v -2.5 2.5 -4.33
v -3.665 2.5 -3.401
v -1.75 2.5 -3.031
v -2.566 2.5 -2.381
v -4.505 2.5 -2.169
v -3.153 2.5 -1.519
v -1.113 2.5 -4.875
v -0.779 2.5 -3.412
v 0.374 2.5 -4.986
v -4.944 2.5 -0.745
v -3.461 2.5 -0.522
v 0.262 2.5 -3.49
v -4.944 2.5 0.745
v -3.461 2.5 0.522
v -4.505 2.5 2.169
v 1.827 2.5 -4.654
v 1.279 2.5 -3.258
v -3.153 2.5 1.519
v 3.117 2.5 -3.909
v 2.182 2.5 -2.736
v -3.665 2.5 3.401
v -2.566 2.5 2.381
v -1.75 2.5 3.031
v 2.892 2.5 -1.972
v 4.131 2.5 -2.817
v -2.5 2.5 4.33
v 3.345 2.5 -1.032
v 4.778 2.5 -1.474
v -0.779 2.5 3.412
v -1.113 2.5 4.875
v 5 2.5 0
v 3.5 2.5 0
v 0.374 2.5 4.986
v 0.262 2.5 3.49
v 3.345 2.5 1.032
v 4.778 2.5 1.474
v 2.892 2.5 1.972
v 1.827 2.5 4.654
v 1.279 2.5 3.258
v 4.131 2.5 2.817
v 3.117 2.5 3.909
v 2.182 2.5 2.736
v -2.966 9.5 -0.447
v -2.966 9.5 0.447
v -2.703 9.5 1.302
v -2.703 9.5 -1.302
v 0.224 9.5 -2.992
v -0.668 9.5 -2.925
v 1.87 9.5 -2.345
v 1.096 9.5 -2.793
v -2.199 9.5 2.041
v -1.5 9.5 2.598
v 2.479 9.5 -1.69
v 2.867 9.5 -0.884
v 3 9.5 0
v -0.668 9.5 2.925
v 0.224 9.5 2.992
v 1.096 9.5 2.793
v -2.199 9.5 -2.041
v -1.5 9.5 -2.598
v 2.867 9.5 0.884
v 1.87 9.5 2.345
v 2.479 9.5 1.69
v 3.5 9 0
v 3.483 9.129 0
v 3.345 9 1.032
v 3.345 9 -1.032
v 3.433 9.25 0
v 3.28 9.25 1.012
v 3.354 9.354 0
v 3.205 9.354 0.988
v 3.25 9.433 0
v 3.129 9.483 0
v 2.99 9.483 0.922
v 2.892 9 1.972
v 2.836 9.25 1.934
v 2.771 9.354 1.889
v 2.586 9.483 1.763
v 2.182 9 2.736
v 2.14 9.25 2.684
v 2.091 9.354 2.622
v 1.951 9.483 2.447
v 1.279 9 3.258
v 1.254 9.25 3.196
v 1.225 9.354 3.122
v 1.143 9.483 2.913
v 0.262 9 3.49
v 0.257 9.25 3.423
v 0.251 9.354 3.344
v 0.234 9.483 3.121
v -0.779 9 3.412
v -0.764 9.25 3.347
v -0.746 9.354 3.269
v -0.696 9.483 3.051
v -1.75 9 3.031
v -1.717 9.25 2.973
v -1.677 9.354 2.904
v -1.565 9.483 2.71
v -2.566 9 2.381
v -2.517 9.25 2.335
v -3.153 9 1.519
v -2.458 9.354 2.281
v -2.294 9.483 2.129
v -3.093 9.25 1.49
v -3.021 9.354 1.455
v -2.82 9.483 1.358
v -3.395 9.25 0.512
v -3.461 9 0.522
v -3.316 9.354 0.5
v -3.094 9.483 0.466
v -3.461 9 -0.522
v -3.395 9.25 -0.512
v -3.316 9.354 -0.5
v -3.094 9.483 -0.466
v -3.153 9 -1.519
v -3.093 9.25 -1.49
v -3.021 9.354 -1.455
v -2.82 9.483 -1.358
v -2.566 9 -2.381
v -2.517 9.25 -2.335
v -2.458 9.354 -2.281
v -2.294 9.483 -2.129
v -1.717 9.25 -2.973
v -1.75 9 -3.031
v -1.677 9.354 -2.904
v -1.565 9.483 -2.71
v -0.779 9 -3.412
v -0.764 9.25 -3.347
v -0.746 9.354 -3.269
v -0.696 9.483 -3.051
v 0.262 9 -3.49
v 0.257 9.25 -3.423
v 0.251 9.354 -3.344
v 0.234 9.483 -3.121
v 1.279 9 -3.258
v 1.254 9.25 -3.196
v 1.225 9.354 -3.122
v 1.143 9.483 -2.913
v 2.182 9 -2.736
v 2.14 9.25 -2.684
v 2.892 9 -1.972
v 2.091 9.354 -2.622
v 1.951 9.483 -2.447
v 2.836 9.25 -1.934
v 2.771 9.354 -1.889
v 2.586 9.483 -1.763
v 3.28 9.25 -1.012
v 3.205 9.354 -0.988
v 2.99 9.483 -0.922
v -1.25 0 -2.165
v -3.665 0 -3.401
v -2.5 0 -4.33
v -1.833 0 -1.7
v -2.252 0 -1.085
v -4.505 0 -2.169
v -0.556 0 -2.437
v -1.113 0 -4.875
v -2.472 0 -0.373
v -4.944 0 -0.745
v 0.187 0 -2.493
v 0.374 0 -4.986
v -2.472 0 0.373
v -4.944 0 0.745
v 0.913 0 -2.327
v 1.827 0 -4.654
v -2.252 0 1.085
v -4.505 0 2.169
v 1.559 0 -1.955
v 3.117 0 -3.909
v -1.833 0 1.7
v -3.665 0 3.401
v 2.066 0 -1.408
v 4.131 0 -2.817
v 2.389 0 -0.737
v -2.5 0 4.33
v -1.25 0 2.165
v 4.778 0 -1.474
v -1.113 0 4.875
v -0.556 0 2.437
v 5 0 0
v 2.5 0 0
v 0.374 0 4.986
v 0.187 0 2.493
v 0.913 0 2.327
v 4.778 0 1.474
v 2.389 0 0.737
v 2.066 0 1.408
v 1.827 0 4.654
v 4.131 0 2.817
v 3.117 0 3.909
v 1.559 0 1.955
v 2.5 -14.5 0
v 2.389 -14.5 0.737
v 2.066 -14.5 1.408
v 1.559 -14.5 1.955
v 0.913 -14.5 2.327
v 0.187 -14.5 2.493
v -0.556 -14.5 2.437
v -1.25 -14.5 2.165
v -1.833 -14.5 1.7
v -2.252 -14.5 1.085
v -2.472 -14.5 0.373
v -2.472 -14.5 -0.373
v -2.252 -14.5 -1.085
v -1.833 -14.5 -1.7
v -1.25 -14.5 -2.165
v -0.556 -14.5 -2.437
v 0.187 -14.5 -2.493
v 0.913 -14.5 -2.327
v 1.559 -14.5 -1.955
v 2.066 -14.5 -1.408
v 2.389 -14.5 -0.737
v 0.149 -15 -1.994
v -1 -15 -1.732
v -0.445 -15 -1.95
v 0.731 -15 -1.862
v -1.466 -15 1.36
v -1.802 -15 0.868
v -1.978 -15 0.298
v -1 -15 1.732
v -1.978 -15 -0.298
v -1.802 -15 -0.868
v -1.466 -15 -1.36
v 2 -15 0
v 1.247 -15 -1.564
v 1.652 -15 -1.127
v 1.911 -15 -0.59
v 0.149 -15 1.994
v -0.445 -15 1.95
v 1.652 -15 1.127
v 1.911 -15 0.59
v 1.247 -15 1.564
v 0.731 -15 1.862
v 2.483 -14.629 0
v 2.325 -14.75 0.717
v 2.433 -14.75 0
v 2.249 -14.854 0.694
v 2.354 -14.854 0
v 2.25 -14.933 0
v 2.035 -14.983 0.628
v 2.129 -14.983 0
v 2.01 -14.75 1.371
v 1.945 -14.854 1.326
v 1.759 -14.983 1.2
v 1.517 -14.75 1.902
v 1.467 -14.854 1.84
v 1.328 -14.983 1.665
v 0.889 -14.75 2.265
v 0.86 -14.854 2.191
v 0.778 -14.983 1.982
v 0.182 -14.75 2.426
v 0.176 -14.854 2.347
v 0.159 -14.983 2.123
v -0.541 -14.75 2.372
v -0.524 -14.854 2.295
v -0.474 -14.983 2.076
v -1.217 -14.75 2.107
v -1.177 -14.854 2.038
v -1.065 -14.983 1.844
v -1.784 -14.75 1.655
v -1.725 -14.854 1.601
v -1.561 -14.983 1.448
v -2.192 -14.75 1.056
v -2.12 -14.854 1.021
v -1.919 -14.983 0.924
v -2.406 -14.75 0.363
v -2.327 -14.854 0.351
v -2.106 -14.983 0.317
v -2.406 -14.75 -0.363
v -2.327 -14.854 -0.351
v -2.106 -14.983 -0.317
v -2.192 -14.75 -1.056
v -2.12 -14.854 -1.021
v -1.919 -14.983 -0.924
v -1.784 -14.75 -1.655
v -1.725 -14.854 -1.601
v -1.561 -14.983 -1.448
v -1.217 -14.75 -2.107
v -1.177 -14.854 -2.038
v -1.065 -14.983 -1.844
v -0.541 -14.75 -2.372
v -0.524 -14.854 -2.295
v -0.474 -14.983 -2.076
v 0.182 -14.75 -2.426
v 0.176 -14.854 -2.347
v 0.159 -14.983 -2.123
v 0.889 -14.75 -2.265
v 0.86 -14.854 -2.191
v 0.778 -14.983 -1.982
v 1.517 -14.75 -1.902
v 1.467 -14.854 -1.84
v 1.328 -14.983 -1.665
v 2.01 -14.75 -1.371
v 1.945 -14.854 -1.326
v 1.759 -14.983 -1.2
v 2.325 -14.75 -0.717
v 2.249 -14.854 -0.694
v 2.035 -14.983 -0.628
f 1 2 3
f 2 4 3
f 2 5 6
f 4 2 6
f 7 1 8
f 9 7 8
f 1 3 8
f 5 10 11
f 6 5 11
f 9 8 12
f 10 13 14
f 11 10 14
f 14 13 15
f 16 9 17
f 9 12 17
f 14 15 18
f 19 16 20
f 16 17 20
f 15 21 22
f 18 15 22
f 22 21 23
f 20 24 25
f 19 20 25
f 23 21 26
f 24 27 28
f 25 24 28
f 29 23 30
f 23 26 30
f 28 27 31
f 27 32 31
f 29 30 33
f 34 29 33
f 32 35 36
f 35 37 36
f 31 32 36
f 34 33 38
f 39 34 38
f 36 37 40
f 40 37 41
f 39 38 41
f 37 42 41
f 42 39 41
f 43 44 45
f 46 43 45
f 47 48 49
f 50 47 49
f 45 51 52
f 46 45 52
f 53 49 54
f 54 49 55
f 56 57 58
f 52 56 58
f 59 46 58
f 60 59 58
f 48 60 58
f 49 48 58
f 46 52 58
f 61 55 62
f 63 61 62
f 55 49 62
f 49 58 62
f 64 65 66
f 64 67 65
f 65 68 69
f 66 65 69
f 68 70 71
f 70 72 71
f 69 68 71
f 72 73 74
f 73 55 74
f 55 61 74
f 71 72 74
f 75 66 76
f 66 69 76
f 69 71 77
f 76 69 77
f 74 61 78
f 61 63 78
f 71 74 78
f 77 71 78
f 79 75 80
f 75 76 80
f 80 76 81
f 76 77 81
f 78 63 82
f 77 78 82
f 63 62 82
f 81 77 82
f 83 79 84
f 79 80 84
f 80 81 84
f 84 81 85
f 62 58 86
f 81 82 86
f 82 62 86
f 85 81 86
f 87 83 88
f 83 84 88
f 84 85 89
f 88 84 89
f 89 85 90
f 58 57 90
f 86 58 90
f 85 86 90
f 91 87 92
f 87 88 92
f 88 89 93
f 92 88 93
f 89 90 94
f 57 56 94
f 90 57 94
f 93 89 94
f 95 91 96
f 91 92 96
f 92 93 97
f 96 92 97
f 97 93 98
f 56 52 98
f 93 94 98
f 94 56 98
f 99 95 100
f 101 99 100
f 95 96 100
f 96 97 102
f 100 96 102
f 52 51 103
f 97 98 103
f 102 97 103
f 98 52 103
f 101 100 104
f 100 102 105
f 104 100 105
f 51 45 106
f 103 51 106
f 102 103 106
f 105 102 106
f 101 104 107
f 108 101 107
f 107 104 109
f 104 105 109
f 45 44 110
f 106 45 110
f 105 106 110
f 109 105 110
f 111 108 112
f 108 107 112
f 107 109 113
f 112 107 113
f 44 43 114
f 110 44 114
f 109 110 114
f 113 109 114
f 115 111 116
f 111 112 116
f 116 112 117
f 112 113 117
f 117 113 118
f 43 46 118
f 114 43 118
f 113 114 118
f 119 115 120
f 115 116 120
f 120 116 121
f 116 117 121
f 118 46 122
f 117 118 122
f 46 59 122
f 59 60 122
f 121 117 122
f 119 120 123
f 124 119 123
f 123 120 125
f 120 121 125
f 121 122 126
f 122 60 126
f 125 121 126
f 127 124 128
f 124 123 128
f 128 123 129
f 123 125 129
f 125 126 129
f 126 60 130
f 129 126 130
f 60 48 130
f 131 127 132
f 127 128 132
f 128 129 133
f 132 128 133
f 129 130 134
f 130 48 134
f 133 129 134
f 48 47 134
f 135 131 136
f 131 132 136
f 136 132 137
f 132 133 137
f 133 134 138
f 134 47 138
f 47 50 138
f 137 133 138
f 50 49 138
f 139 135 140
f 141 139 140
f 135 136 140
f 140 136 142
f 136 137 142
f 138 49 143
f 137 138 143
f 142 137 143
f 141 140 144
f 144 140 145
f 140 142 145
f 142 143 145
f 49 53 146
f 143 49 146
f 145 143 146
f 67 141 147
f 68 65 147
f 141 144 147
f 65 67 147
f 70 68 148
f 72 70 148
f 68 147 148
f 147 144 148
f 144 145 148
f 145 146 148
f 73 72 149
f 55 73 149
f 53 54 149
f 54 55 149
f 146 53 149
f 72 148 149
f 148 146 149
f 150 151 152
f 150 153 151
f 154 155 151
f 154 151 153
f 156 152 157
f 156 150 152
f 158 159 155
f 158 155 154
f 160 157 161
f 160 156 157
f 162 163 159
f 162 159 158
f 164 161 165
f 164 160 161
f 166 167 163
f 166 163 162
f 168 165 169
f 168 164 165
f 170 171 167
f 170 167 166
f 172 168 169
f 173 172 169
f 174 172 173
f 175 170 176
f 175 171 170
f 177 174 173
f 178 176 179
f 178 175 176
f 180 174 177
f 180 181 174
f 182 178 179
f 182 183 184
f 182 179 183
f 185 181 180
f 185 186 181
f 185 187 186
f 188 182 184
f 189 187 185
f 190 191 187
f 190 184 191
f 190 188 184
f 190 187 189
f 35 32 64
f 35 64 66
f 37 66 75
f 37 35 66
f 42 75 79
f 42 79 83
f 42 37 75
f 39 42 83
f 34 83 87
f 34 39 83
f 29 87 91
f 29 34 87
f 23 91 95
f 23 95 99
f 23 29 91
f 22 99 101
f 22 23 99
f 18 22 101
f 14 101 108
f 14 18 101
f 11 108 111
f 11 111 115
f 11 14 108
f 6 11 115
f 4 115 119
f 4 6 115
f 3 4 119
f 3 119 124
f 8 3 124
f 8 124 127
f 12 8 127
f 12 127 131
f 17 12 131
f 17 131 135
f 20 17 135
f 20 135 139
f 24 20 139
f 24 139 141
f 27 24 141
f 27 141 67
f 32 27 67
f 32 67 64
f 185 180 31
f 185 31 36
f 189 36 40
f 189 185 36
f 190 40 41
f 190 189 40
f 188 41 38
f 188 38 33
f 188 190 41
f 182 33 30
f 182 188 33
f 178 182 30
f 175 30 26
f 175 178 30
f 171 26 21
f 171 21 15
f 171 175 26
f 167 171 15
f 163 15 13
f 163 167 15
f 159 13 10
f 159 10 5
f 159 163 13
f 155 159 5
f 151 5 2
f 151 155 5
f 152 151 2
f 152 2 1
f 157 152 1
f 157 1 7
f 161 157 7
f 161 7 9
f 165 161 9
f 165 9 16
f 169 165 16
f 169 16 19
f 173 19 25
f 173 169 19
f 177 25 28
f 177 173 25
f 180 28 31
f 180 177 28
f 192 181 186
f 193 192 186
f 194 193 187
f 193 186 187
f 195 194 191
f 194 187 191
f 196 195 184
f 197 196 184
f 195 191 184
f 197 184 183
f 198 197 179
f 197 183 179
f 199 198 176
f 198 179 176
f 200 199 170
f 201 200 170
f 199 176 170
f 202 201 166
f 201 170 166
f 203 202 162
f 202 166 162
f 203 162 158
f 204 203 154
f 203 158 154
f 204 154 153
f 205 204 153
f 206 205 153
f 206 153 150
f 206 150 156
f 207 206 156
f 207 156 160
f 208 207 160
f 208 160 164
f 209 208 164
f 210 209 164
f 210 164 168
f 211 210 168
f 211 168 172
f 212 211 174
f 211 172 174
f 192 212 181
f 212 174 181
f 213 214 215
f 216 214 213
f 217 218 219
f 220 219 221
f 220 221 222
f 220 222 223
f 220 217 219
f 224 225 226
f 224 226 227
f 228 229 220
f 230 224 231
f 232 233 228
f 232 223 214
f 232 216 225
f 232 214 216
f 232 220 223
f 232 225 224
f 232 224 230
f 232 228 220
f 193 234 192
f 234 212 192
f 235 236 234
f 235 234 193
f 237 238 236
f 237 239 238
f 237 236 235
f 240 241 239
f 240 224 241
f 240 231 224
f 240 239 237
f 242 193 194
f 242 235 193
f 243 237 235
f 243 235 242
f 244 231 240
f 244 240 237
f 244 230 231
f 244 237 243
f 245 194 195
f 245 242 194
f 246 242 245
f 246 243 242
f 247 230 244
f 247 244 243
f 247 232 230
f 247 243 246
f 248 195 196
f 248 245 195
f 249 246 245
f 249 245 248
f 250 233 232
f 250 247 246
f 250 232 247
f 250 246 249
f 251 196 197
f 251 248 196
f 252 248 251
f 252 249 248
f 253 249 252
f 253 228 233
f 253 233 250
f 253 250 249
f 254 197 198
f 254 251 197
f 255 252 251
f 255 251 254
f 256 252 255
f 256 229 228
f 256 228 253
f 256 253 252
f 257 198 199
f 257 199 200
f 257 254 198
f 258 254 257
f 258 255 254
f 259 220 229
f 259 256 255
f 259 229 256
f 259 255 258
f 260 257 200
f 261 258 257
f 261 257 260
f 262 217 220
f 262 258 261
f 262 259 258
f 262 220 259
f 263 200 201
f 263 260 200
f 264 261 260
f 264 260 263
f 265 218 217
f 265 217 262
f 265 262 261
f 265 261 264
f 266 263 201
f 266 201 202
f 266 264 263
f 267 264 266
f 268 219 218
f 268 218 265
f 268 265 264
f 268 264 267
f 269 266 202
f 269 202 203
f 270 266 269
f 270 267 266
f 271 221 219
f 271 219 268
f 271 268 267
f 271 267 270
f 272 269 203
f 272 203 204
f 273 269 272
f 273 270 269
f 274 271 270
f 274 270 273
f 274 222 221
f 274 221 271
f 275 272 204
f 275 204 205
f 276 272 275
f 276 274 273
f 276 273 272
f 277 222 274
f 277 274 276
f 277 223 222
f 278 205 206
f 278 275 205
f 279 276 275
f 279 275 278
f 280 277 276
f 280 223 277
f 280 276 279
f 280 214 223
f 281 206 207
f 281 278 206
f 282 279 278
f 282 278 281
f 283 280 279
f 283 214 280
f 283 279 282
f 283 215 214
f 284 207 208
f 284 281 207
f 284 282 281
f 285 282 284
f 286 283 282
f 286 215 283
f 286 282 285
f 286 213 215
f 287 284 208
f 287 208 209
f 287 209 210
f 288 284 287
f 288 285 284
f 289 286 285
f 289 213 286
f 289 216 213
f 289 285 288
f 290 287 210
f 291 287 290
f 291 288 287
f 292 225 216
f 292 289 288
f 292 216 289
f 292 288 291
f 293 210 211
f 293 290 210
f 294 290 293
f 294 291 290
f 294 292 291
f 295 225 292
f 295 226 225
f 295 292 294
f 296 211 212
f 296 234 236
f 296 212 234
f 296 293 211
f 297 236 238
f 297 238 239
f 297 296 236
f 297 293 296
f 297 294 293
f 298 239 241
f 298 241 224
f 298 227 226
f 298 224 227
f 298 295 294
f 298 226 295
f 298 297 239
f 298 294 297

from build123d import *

# Parameters (mm, degrees)
F0_R     = 2.5
F1_DEPTH = 15
F0_R_2   = 5
F0_R_3   = 3.5
F2_DEPTH = 2.5
F3_DEPTH = 9.5
F4_R     = 0.5
F5_R     = 0.5


with BuildPart() as f1:
    # F0 (on Front) → F1 (new body)
    with BuildSketch(Plane.XZ):
        Circle(F0_R)
    extrude(amount=F1_DEPTH)

    # F0 (on Front) → F2 (join)
    with BuildSketch(Plane.XZ):
        Circle(F0_R_2)
        Circle(F0_R_3, mode=Mode.SUBTRACT)
        Circle(F0_R_3)
        Circle(F0_R, mode=Mode.SUBTRACT)
        Circle(F0_R)
    extrude(amount=-F2_DEPTH)

    # F0 (on Front) → F3 (join)
    with BuildSketch(Plane.XZ):
        Circle(F0_R_3)
        Circle(F0_R, mode=Mode.SUBTRACT)
        Circle(F0_R)
    extrude(amount=-F3_DEPTH)

    # F4
    f4_edges = [f1.edges().sort_by_distance(p)[0] for p in [
        (-3.5, 9.5, 0),
    ]]
    fillet(f4_edges, radius=F4_R)

    # F5
    f5_edges = [f1.edges().sort_by_distance(p)[0] for p in [
        (-2.5, -15, 0),
    ]]
    fillet(f5_edges, radius=F5_R)


solid = f1.part
